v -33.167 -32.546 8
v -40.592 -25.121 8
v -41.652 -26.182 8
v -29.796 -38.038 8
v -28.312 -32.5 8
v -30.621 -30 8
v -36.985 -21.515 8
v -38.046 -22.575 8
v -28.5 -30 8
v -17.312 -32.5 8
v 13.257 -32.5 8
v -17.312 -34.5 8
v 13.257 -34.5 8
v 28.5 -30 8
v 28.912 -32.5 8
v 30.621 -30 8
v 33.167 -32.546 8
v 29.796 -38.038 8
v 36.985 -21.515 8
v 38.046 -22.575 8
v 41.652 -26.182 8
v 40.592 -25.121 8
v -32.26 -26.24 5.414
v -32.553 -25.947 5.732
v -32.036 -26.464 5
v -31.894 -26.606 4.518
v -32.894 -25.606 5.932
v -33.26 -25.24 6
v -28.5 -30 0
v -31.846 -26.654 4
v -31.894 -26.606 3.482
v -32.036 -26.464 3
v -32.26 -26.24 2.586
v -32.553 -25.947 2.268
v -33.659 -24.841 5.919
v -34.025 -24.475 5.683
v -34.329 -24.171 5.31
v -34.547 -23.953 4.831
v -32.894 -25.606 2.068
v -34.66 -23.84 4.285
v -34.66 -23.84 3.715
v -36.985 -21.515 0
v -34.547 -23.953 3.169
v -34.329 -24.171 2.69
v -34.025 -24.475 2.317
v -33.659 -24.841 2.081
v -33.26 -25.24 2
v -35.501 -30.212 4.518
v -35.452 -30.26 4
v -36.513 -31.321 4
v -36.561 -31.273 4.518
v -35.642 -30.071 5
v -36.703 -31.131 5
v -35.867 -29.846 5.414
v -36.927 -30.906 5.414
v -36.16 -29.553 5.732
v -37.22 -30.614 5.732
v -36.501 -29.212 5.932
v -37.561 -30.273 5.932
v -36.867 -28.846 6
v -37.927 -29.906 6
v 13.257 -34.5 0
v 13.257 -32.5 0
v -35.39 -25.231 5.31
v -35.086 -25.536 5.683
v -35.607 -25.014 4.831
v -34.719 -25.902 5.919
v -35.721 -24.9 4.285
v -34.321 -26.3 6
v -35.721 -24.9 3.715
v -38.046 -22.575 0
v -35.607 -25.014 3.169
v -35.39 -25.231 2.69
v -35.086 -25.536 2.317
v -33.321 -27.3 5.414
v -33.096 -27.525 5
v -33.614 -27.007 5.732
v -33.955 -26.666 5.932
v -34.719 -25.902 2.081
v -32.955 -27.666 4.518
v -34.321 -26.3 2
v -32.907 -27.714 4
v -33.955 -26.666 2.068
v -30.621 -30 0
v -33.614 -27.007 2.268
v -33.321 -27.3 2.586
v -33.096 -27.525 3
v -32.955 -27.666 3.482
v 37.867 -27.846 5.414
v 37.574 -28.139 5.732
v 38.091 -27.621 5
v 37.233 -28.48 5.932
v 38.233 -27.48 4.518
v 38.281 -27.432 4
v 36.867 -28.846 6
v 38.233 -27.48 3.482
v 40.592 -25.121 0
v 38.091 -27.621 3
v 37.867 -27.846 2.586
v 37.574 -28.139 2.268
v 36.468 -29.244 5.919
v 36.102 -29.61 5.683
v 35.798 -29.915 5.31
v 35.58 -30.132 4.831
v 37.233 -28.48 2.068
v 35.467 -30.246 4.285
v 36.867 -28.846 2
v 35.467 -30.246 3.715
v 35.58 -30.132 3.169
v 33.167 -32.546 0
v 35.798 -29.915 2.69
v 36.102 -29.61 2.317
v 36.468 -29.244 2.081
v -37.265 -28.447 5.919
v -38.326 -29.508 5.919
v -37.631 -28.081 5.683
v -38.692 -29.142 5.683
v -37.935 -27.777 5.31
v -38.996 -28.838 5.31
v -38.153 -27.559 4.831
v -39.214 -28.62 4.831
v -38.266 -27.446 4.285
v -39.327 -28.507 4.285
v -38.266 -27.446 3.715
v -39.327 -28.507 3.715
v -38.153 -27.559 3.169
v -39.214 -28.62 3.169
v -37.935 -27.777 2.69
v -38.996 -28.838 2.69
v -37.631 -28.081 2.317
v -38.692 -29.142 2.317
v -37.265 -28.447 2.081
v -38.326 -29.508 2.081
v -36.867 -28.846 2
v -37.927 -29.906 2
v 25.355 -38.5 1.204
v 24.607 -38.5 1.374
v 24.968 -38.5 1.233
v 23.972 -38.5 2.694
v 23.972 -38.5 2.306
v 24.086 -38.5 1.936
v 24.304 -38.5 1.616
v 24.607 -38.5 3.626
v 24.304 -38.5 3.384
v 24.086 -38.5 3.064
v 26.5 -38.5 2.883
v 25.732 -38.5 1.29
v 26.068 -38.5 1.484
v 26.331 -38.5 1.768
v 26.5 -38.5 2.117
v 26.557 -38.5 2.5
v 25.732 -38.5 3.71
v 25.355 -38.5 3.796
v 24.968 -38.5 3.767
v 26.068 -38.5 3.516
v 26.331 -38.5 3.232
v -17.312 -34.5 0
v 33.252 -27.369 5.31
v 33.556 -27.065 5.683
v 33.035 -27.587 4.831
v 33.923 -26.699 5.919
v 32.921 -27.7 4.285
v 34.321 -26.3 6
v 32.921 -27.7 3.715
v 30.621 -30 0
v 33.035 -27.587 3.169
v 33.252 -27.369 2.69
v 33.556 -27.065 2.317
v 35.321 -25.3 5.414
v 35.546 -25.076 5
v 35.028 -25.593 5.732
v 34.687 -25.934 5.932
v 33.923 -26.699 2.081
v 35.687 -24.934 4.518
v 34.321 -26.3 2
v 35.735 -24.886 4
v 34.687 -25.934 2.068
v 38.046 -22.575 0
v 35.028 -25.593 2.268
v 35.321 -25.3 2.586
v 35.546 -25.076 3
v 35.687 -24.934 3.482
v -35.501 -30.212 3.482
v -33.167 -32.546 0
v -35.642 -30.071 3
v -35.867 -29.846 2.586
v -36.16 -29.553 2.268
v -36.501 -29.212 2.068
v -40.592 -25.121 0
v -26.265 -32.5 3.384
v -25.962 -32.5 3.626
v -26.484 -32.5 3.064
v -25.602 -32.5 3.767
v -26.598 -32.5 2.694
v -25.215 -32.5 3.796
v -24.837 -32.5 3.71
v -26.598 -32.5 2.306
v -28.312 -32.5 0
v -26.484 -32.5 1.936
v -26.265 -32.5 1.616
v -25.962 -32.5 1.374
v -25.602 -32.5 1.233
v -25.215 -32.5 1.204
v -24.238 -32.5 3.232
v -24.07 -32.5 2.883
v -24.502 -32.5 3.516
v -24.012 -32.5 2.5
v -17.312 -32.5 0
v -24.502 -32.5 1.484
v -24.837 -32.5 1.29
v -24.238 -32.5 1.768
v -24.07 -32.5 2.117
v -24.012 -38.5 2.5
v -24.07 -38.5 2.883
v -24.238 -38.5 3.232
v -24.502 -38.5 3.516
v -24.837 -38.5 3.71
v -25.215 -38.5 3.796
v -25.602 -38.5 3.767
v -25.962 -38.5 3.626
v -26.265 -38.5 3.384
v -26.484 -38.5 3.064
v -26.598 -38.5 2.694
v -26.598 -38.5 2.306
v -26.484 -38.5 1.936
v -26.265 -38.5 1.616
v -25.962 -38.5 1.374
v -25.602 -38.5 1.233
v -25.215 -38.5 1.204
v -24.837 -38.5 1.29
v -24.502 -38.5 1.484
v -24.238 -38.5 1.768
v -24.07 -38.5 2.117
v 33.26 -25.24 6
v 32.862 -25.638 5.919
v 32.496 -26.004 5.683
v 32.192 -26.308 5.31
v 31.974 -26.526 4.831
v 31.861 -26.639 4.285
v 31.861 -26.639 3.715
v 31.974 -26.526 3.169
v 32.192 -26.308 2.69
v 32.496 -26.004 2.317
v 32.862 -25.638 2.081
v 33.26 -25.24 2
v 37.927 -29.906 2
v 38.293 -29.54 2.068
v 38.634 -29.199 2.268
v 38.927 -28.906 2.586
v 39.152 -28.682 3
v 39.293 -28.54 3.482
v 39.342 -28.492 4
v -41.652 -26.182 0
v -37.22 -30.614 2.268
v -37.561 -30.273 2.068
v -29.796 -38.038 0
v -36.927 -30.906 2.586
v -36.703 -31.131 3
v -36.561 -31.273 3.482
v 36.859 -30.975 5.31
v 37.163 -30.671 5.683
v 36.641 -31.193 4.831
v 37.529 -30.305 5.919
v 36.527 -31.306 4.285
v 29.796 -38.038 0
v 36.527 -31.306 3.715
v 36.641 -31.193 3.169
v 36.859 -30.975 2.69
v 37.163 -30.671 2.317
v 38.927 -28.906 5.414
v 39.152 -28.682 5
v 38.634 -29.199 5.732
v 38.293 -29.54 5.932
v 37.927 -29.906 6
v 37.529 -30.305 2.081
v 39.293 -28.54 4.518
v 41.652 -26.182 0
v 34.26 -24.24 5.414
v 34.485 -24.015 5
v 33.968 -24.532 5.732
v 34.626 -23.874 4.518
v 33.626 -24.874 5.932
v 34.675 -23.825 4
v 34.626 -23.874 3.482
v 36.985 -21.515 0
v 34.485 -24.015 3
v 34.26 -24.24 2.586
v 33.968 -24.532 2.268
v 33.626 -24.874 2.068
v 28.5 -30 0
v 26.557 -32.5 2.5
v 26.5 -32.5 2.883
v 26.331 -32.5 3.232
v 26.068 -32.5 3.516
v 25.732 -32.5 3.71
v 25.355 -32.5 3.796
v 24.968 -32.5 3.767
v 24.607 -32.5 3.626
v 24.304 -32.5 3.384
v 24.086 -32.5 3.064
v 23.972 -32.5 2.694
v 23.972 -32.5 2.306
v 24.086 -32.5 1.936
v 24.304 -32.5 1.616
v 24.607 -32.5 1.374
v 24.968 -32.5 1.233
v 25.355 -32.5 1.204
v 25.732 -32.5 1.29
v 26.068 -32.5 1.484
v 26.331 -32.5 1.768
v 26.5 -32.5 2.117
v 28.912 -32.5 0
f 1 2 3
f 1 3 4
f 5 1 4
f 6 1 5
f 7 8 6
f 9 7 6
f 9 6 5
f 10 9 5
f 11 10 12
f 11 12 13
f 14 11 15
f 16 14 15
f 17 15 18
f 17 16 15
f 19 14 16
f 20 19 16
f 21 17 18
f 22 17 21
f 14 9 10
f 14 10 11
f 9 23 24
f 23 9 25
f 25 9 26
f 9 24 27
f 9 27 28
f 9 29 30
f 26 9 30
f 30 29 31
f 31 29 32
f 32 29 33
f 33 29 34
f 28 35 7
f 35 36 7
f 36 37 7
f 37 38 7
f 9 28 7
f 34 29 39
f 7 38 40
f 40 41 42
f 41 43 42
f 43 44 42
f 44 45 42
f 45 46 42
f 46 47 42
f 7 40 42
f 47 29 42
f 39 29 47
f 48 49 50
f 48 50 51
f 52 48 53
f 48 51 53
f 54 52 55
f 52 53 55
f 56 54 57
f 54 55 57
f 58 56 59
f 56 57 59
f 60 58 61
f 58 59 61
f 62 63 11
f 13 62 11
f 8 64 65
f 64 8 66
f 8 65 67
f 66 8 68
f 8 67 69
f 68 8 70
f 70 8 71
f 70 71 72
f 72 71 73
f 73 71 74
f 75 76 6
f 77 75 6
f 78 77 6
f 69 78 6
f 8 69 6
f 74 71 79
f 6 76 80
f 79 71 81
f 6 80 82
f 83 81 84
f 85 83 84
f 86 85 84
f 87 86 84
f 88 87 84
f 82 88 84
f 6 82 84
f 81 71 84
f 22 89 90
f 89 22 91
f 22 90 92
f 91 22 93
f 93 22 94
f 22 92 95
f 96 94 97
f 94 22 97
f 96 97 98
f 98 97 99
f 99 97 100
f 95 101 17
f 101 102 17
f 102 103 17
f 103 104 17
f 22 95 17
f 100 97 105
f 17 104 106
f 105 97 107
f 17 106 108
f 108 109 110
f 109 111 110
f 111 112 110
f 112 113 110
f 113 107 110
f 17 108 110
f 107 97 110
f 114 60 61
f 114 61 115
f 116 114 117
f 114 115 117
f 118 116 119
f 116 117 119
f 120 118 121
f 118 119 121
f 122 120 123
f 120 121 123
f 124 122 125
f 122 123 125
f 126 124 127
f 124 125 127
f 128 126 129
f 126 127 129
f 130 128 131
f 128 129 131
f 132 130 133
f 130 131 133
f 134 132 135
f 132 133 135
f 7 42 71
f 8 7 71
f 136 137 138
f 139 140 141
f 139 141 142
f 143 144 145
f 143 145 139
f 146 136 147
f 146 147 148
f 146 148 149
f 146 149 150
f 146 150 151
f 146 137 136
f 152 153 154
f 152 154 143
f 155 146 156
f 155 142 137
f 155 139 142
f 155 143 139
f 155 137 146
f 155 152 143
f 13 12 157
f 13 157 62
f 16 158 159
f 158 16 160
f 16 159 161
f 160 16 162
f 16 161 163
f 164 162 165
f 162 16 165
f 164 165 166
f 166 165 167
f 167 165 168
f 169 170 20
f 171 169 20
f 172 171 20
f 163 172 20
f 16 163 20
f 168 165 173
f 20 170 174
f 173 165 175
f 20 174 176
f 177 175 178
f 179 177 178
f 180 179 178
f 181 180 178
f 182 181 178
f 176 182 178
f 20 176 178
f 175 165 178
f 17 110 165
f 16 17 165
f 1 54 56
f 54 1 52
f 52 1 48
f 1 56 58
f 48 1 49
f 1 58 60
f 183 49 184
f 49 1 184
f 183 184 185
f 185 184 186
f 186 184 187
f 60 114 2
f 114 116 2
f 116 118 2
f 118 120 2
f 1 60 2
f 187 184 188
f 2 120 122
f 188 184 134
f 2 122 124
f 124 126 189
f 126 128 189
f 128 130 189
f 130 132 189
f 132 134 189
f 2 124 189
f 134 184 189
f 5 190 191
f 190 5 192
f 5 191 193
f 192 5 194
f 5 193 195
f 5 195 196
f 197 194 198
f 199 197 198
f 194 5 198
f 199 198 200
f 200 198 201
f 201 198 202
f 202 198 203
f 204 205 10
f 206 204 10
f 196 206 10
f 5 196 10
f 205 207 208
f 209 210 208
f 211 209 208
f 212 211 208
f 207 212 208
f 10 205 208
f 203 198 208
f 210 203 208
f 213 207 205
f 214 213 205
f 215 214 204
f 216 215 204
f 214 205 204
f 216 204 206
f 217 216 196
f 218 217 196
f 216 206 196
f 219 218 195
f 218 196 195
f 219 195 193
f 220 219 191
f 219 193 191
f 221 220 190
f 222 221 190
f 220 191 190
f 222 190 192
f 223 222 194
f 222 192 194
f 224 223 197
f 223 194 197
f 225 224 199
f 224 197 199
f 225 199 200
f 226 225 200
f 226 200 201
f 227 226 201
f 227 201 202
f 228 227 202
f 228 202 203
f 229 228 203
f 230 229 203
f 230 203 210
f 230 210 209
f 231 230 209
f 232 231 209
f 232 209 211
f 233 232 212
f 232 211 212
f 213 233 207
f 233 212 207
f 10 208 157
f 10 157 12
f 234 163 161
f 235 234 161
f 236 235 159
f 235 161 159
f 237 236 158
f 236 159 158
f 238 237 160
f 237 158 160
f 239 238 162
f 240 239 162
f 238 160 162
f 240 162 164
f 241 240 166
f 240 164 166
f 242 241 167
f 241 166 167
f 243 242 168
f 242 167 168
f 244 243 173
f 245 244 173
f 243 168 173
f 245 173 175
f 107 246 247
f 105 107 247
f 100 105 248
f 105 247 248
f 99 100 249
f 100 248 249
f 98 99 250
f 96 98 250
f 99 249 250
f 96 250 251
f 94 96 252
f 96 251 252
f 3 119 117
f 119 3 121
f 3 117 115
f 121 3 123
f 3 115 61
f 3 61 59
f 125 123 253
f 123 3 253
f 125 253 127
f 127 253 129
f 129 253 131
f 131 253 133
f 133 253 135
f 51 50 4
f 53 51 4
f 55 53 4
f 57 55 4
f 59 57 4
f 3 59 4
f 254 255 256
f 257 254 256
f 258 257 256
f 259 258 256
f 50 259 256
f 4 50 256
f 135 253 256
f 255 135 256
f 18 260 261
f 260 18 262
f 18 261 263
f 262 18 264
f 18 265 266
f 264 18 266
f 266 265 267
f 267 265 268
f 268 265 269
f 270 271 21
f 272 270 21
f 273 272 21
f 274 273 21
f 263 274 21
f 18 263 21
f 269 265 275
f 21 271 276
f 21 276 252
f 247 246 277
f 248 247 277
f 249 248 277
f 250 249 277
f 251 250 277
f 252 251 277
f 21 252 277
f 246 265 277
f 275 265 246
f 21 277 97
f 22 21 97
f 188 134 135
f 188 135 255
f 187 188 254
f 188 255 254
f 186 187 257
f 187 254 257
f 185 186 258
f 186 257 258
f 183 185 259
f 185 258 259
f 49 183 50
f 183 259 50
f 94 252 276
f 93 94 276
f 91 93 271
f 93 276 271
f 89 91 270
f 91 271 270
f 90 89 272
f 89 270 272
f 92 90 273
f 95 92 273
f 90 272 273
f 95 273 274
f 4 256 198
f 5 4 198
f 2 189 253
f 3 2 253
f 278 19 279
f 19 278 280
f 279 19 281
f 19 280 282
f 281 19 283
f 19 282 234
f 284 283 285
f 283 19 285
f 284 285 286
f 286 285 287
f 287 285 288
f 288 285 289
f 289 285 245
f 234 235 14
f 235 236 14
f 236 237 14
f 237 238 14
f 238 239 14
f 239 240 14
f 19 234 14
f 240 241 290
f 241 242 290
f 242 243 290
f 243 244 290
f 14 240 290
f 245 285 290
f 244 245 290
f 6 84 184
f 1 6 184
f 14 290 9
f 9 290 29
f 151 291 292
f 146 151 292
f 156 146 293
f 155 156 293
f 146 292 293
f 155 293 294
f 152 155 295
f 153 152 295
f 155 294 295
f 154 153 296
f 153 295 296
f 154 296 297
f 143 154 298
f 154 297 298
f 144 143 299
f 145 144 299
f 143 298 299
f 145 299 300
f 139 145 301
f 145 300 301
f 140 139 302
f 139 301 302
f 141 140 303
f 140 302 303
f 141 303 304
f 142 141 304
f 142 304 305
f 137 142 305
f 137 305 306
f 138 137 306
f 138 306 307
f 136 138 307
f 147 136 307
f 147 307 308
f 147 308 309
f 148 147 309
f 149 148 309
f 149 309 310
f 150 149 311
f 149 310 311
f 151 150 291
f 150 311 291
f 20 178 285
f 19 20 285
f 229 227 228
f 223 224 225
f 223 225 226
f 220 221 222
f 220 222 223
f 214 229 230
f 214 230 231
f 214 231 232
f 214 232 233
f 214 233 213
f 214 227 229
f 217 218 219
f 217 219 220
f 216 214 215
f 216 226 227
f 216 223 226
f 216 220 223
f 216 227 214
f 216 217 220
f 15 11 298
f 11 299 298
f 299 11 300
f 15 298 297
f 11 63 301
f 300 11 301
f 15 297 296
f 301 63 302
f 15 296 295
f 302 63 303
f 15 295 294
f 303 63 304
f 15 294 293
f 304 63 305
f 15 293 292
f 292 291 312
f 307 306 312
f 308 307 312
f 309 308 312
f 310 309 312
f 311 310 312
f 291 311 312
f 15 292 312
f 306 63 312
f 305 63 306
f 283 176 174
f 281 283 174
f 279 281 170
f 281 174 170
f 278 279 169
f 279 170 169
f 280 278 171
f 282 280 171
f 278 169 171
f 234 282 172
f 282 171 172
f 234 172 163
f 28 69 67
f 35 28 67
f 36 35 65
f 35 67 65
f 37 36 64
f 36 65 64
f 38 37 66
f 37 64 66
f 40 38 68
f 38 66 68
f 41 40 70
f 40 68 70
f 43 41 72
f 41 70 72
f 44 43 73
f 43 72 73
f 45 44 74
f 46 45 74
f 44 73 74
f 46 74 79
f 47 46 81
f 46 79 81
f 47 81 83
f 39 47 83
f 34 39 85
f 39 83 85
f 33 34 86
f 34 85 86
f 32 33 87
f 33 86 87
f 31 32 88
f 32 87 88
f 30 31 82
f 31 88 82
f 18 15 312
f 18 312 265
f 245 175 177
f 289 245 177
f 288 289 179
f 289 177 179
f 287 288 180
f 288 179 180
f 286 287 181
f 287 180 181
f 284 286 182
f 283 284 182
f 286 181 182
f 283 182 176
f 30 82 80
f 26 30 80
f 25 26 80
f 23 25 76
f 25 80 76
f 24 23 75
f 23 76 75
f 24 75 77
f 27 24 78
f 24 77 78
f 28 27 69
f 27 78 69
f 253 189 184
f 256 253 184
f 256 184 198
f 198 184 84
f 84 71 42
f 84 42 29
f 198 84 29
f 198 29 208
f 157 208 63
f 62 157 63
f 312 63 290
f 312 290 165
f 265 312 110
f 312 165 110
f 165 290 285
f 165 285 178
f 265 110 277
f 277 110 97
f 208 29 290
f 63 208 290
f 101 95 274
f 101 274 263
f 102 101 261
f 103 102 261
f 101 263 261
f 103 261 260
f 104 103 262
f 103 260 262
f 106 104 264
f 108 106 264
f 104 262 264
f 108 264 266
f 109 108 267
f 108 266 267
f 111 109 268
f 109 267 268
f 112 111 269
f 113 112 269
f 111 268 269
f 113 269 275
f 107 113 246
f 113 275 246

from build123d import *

# Parameters (mm, degrees)
F1_DEPTH = 8
F3_DEPTH = 10
F5_DEPTH = 9.9
F6_W     = 30.56961
F6_H     = 8
F7_DEPTH = 2
F6_R     = 1.3
F8_DEPTH = 6


with BuildPart() as f1:
    # F0 (on Top) → F1 (new body)
    with BuildSketch(Plane.XY):
        Polygon((28.5, -30), (-28.5, -30), (-36.985281, -21.514719), (-38.045942, -22.575379), (-30.62132, -30), (-33.166905, -32.545584), (-40.591526, -25.120963), (-41.652186, -26.181623), (-29.795584, -38.038225), (-28.312251, -32.5), (28.912205, -32.5), (29.795584, -38.038225), (41.652186, -26.181623), (40.591526, -25.120963), (33.166905, -32.545584), (30.62132, -30), (38.045942, -22.575379), (36.985281, -21.514719), align=None)
    extrude(amount=F1_DEPTH)

    # F2 (on face) → F3 (cut)
    with BuildSketch(Plane(origin=(33.916905, -33.916905, 0), x_dir=(0.707107, 0.707107, 0), z_dir=(0.707107, -0.707107, 0))):
        with BuildLine():
            ThreePointArc((7.671573, 4), (7.085786, 5.414214), (5.671573, 6))
            ThreePointArc((5.671573, 6), (3.671573, 4), (5.671573, 2))
            ThreePointArc((5.671573, 2), (7.085786, 2.585786), (7.671573, 4))
        make_face()
    extrude(amount=-F3_DEPTH, mode=Mode.SUBTRACT)

    # F4 (on face) → F5 (cut)
    with BuildSketch(Plane(origin=(-33.916905, -33.916905, 0), x_dir=(0.707107, -0.707107, 0), z_dir=(-0.707107, -0.707107, 0))):
        with BuildLine():
            ThreePointArc((-3.671573, 4), (-4.257359, 5.414214), (-5.671573, 6))
            ThreePointArc((-5.671573, 6), (-7.671573, 4), (-5.671573, 2))
            ThreePointArc((-5.671573, 2), (-4.257359, 2.585786), (-3.671573, 4))
        make_face()
    extrude(amount=-F5_DEPTH, mode=Mode.SUBTRACT)

    # F6 (on face) → F7 (join)
    with BuildSketch(Plane.XZ.offset(32.5)):
        with Locations((-2.027446, 4)):
            Rectangle(F6_W, F6_H)
    extrude(amount=F7_DEPTH)

    # F6 (on face) → F8 (join)
    with BuildSketch(Plane.XZ.offset(32.5)):
        with Locations((-25.312251, 2.5)):
            Circle(F6_R)
        with Locations((25.257359, 2.5)):
            Circle(F6_R)
    extrude(amount=F8_DEPTH)


solid = f1.part
